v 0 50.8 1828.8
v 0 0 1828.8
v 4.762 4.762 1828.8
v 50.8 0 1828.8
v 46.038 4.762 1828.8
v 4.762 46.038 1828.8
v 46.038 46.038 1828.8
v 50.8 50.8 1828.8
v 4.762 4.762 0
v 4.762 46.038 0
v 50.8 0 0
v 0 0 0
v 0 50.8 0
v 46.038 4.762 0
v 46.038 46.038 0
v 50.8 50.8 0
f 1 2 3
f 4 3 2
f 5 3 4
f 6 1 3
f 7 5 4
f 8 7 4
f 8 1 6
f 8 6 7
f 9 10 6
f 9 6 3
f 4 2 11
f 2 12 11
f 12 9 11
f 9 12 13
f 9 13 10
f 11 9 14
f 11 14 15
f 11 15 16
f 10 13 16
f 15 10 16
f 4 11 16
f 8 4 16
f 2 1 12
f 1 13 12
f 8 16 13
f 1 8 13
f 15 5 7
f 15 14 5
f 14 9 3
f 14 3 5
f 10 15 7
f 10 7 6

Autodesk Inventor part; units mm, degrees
ref_plane "YZ Plane" through (0, 0, 0) normal (1, 0, 0) x (0, 1, 0)
ref_plane "XZ Plane" through (0, 0, 0) normal (0, 1, 0) x (-1, 0, 0)
ref_plane "XY Plane" through (0, 0, 0) normal (0, 0, 1) x (1, 0, 0)
sketch "Sketch1" plane through (0, 0, 0) normal (0, 0, 1) x (1, 0, 0)
  line L0 (0, 0) -> (50.8, 0)
  line L1 (50.8, 0) -> (50.8, 50.8)
  line L2 (50.8, 50.8) -> (0, 50.8)
  line L3 (0, 50.8) -> (0, 0)
  line L4 (0, 0) -> (4.7625, 0) construction
  line L5 (4.7625, 0) -> (4.7625, 4.7625) construction
  line L6 (4.7625, 4.7625) -> (0, 4.7625) construction
  line L7 (0, 4.7625) -> (0, 0) construction
  line L8 (50.8, 50.8) -> (46.0375, 50.8) construction
  line L9 (46.0375, 50.8) -> (46.0375, 46.0375) construction
  line L10 (46.0375, 46.0375) -> (50.8, 46.0375) construction
  line L11 (50.8, 46.0375) -> (50.8, 50.8) construction
  line L12 (46.0375, 46.0375) -> (4.7625, 46.0375)
  line L13 (4.7625, 46.0375) -> (4.7625, 4.7625)
  line L14 (4.7625, 4.7625) -> (46.0375, 4.7625)
  line L15 (46.0375, 4.7625) -> (46.0375, 46.0375)
  dimension "d0" = 50.8
  dimension "d1" = 50.8
  dimension "d2" = 4.7625
  dimension "d3" = 4.7625
  dimension "d4" = 4.7625
  dimension "d5" = 4.7625
extrude "Extrusion1" add sketch "Sketch1" along normal blind 1828.8
equation "\"d0\" = d1"
equation "\"d2\" = d3"
equation "\"d4\" = d3"
equation "\"d5\" = d3"
properties part number "72in2.0Sq" material "Steel, Mild"
